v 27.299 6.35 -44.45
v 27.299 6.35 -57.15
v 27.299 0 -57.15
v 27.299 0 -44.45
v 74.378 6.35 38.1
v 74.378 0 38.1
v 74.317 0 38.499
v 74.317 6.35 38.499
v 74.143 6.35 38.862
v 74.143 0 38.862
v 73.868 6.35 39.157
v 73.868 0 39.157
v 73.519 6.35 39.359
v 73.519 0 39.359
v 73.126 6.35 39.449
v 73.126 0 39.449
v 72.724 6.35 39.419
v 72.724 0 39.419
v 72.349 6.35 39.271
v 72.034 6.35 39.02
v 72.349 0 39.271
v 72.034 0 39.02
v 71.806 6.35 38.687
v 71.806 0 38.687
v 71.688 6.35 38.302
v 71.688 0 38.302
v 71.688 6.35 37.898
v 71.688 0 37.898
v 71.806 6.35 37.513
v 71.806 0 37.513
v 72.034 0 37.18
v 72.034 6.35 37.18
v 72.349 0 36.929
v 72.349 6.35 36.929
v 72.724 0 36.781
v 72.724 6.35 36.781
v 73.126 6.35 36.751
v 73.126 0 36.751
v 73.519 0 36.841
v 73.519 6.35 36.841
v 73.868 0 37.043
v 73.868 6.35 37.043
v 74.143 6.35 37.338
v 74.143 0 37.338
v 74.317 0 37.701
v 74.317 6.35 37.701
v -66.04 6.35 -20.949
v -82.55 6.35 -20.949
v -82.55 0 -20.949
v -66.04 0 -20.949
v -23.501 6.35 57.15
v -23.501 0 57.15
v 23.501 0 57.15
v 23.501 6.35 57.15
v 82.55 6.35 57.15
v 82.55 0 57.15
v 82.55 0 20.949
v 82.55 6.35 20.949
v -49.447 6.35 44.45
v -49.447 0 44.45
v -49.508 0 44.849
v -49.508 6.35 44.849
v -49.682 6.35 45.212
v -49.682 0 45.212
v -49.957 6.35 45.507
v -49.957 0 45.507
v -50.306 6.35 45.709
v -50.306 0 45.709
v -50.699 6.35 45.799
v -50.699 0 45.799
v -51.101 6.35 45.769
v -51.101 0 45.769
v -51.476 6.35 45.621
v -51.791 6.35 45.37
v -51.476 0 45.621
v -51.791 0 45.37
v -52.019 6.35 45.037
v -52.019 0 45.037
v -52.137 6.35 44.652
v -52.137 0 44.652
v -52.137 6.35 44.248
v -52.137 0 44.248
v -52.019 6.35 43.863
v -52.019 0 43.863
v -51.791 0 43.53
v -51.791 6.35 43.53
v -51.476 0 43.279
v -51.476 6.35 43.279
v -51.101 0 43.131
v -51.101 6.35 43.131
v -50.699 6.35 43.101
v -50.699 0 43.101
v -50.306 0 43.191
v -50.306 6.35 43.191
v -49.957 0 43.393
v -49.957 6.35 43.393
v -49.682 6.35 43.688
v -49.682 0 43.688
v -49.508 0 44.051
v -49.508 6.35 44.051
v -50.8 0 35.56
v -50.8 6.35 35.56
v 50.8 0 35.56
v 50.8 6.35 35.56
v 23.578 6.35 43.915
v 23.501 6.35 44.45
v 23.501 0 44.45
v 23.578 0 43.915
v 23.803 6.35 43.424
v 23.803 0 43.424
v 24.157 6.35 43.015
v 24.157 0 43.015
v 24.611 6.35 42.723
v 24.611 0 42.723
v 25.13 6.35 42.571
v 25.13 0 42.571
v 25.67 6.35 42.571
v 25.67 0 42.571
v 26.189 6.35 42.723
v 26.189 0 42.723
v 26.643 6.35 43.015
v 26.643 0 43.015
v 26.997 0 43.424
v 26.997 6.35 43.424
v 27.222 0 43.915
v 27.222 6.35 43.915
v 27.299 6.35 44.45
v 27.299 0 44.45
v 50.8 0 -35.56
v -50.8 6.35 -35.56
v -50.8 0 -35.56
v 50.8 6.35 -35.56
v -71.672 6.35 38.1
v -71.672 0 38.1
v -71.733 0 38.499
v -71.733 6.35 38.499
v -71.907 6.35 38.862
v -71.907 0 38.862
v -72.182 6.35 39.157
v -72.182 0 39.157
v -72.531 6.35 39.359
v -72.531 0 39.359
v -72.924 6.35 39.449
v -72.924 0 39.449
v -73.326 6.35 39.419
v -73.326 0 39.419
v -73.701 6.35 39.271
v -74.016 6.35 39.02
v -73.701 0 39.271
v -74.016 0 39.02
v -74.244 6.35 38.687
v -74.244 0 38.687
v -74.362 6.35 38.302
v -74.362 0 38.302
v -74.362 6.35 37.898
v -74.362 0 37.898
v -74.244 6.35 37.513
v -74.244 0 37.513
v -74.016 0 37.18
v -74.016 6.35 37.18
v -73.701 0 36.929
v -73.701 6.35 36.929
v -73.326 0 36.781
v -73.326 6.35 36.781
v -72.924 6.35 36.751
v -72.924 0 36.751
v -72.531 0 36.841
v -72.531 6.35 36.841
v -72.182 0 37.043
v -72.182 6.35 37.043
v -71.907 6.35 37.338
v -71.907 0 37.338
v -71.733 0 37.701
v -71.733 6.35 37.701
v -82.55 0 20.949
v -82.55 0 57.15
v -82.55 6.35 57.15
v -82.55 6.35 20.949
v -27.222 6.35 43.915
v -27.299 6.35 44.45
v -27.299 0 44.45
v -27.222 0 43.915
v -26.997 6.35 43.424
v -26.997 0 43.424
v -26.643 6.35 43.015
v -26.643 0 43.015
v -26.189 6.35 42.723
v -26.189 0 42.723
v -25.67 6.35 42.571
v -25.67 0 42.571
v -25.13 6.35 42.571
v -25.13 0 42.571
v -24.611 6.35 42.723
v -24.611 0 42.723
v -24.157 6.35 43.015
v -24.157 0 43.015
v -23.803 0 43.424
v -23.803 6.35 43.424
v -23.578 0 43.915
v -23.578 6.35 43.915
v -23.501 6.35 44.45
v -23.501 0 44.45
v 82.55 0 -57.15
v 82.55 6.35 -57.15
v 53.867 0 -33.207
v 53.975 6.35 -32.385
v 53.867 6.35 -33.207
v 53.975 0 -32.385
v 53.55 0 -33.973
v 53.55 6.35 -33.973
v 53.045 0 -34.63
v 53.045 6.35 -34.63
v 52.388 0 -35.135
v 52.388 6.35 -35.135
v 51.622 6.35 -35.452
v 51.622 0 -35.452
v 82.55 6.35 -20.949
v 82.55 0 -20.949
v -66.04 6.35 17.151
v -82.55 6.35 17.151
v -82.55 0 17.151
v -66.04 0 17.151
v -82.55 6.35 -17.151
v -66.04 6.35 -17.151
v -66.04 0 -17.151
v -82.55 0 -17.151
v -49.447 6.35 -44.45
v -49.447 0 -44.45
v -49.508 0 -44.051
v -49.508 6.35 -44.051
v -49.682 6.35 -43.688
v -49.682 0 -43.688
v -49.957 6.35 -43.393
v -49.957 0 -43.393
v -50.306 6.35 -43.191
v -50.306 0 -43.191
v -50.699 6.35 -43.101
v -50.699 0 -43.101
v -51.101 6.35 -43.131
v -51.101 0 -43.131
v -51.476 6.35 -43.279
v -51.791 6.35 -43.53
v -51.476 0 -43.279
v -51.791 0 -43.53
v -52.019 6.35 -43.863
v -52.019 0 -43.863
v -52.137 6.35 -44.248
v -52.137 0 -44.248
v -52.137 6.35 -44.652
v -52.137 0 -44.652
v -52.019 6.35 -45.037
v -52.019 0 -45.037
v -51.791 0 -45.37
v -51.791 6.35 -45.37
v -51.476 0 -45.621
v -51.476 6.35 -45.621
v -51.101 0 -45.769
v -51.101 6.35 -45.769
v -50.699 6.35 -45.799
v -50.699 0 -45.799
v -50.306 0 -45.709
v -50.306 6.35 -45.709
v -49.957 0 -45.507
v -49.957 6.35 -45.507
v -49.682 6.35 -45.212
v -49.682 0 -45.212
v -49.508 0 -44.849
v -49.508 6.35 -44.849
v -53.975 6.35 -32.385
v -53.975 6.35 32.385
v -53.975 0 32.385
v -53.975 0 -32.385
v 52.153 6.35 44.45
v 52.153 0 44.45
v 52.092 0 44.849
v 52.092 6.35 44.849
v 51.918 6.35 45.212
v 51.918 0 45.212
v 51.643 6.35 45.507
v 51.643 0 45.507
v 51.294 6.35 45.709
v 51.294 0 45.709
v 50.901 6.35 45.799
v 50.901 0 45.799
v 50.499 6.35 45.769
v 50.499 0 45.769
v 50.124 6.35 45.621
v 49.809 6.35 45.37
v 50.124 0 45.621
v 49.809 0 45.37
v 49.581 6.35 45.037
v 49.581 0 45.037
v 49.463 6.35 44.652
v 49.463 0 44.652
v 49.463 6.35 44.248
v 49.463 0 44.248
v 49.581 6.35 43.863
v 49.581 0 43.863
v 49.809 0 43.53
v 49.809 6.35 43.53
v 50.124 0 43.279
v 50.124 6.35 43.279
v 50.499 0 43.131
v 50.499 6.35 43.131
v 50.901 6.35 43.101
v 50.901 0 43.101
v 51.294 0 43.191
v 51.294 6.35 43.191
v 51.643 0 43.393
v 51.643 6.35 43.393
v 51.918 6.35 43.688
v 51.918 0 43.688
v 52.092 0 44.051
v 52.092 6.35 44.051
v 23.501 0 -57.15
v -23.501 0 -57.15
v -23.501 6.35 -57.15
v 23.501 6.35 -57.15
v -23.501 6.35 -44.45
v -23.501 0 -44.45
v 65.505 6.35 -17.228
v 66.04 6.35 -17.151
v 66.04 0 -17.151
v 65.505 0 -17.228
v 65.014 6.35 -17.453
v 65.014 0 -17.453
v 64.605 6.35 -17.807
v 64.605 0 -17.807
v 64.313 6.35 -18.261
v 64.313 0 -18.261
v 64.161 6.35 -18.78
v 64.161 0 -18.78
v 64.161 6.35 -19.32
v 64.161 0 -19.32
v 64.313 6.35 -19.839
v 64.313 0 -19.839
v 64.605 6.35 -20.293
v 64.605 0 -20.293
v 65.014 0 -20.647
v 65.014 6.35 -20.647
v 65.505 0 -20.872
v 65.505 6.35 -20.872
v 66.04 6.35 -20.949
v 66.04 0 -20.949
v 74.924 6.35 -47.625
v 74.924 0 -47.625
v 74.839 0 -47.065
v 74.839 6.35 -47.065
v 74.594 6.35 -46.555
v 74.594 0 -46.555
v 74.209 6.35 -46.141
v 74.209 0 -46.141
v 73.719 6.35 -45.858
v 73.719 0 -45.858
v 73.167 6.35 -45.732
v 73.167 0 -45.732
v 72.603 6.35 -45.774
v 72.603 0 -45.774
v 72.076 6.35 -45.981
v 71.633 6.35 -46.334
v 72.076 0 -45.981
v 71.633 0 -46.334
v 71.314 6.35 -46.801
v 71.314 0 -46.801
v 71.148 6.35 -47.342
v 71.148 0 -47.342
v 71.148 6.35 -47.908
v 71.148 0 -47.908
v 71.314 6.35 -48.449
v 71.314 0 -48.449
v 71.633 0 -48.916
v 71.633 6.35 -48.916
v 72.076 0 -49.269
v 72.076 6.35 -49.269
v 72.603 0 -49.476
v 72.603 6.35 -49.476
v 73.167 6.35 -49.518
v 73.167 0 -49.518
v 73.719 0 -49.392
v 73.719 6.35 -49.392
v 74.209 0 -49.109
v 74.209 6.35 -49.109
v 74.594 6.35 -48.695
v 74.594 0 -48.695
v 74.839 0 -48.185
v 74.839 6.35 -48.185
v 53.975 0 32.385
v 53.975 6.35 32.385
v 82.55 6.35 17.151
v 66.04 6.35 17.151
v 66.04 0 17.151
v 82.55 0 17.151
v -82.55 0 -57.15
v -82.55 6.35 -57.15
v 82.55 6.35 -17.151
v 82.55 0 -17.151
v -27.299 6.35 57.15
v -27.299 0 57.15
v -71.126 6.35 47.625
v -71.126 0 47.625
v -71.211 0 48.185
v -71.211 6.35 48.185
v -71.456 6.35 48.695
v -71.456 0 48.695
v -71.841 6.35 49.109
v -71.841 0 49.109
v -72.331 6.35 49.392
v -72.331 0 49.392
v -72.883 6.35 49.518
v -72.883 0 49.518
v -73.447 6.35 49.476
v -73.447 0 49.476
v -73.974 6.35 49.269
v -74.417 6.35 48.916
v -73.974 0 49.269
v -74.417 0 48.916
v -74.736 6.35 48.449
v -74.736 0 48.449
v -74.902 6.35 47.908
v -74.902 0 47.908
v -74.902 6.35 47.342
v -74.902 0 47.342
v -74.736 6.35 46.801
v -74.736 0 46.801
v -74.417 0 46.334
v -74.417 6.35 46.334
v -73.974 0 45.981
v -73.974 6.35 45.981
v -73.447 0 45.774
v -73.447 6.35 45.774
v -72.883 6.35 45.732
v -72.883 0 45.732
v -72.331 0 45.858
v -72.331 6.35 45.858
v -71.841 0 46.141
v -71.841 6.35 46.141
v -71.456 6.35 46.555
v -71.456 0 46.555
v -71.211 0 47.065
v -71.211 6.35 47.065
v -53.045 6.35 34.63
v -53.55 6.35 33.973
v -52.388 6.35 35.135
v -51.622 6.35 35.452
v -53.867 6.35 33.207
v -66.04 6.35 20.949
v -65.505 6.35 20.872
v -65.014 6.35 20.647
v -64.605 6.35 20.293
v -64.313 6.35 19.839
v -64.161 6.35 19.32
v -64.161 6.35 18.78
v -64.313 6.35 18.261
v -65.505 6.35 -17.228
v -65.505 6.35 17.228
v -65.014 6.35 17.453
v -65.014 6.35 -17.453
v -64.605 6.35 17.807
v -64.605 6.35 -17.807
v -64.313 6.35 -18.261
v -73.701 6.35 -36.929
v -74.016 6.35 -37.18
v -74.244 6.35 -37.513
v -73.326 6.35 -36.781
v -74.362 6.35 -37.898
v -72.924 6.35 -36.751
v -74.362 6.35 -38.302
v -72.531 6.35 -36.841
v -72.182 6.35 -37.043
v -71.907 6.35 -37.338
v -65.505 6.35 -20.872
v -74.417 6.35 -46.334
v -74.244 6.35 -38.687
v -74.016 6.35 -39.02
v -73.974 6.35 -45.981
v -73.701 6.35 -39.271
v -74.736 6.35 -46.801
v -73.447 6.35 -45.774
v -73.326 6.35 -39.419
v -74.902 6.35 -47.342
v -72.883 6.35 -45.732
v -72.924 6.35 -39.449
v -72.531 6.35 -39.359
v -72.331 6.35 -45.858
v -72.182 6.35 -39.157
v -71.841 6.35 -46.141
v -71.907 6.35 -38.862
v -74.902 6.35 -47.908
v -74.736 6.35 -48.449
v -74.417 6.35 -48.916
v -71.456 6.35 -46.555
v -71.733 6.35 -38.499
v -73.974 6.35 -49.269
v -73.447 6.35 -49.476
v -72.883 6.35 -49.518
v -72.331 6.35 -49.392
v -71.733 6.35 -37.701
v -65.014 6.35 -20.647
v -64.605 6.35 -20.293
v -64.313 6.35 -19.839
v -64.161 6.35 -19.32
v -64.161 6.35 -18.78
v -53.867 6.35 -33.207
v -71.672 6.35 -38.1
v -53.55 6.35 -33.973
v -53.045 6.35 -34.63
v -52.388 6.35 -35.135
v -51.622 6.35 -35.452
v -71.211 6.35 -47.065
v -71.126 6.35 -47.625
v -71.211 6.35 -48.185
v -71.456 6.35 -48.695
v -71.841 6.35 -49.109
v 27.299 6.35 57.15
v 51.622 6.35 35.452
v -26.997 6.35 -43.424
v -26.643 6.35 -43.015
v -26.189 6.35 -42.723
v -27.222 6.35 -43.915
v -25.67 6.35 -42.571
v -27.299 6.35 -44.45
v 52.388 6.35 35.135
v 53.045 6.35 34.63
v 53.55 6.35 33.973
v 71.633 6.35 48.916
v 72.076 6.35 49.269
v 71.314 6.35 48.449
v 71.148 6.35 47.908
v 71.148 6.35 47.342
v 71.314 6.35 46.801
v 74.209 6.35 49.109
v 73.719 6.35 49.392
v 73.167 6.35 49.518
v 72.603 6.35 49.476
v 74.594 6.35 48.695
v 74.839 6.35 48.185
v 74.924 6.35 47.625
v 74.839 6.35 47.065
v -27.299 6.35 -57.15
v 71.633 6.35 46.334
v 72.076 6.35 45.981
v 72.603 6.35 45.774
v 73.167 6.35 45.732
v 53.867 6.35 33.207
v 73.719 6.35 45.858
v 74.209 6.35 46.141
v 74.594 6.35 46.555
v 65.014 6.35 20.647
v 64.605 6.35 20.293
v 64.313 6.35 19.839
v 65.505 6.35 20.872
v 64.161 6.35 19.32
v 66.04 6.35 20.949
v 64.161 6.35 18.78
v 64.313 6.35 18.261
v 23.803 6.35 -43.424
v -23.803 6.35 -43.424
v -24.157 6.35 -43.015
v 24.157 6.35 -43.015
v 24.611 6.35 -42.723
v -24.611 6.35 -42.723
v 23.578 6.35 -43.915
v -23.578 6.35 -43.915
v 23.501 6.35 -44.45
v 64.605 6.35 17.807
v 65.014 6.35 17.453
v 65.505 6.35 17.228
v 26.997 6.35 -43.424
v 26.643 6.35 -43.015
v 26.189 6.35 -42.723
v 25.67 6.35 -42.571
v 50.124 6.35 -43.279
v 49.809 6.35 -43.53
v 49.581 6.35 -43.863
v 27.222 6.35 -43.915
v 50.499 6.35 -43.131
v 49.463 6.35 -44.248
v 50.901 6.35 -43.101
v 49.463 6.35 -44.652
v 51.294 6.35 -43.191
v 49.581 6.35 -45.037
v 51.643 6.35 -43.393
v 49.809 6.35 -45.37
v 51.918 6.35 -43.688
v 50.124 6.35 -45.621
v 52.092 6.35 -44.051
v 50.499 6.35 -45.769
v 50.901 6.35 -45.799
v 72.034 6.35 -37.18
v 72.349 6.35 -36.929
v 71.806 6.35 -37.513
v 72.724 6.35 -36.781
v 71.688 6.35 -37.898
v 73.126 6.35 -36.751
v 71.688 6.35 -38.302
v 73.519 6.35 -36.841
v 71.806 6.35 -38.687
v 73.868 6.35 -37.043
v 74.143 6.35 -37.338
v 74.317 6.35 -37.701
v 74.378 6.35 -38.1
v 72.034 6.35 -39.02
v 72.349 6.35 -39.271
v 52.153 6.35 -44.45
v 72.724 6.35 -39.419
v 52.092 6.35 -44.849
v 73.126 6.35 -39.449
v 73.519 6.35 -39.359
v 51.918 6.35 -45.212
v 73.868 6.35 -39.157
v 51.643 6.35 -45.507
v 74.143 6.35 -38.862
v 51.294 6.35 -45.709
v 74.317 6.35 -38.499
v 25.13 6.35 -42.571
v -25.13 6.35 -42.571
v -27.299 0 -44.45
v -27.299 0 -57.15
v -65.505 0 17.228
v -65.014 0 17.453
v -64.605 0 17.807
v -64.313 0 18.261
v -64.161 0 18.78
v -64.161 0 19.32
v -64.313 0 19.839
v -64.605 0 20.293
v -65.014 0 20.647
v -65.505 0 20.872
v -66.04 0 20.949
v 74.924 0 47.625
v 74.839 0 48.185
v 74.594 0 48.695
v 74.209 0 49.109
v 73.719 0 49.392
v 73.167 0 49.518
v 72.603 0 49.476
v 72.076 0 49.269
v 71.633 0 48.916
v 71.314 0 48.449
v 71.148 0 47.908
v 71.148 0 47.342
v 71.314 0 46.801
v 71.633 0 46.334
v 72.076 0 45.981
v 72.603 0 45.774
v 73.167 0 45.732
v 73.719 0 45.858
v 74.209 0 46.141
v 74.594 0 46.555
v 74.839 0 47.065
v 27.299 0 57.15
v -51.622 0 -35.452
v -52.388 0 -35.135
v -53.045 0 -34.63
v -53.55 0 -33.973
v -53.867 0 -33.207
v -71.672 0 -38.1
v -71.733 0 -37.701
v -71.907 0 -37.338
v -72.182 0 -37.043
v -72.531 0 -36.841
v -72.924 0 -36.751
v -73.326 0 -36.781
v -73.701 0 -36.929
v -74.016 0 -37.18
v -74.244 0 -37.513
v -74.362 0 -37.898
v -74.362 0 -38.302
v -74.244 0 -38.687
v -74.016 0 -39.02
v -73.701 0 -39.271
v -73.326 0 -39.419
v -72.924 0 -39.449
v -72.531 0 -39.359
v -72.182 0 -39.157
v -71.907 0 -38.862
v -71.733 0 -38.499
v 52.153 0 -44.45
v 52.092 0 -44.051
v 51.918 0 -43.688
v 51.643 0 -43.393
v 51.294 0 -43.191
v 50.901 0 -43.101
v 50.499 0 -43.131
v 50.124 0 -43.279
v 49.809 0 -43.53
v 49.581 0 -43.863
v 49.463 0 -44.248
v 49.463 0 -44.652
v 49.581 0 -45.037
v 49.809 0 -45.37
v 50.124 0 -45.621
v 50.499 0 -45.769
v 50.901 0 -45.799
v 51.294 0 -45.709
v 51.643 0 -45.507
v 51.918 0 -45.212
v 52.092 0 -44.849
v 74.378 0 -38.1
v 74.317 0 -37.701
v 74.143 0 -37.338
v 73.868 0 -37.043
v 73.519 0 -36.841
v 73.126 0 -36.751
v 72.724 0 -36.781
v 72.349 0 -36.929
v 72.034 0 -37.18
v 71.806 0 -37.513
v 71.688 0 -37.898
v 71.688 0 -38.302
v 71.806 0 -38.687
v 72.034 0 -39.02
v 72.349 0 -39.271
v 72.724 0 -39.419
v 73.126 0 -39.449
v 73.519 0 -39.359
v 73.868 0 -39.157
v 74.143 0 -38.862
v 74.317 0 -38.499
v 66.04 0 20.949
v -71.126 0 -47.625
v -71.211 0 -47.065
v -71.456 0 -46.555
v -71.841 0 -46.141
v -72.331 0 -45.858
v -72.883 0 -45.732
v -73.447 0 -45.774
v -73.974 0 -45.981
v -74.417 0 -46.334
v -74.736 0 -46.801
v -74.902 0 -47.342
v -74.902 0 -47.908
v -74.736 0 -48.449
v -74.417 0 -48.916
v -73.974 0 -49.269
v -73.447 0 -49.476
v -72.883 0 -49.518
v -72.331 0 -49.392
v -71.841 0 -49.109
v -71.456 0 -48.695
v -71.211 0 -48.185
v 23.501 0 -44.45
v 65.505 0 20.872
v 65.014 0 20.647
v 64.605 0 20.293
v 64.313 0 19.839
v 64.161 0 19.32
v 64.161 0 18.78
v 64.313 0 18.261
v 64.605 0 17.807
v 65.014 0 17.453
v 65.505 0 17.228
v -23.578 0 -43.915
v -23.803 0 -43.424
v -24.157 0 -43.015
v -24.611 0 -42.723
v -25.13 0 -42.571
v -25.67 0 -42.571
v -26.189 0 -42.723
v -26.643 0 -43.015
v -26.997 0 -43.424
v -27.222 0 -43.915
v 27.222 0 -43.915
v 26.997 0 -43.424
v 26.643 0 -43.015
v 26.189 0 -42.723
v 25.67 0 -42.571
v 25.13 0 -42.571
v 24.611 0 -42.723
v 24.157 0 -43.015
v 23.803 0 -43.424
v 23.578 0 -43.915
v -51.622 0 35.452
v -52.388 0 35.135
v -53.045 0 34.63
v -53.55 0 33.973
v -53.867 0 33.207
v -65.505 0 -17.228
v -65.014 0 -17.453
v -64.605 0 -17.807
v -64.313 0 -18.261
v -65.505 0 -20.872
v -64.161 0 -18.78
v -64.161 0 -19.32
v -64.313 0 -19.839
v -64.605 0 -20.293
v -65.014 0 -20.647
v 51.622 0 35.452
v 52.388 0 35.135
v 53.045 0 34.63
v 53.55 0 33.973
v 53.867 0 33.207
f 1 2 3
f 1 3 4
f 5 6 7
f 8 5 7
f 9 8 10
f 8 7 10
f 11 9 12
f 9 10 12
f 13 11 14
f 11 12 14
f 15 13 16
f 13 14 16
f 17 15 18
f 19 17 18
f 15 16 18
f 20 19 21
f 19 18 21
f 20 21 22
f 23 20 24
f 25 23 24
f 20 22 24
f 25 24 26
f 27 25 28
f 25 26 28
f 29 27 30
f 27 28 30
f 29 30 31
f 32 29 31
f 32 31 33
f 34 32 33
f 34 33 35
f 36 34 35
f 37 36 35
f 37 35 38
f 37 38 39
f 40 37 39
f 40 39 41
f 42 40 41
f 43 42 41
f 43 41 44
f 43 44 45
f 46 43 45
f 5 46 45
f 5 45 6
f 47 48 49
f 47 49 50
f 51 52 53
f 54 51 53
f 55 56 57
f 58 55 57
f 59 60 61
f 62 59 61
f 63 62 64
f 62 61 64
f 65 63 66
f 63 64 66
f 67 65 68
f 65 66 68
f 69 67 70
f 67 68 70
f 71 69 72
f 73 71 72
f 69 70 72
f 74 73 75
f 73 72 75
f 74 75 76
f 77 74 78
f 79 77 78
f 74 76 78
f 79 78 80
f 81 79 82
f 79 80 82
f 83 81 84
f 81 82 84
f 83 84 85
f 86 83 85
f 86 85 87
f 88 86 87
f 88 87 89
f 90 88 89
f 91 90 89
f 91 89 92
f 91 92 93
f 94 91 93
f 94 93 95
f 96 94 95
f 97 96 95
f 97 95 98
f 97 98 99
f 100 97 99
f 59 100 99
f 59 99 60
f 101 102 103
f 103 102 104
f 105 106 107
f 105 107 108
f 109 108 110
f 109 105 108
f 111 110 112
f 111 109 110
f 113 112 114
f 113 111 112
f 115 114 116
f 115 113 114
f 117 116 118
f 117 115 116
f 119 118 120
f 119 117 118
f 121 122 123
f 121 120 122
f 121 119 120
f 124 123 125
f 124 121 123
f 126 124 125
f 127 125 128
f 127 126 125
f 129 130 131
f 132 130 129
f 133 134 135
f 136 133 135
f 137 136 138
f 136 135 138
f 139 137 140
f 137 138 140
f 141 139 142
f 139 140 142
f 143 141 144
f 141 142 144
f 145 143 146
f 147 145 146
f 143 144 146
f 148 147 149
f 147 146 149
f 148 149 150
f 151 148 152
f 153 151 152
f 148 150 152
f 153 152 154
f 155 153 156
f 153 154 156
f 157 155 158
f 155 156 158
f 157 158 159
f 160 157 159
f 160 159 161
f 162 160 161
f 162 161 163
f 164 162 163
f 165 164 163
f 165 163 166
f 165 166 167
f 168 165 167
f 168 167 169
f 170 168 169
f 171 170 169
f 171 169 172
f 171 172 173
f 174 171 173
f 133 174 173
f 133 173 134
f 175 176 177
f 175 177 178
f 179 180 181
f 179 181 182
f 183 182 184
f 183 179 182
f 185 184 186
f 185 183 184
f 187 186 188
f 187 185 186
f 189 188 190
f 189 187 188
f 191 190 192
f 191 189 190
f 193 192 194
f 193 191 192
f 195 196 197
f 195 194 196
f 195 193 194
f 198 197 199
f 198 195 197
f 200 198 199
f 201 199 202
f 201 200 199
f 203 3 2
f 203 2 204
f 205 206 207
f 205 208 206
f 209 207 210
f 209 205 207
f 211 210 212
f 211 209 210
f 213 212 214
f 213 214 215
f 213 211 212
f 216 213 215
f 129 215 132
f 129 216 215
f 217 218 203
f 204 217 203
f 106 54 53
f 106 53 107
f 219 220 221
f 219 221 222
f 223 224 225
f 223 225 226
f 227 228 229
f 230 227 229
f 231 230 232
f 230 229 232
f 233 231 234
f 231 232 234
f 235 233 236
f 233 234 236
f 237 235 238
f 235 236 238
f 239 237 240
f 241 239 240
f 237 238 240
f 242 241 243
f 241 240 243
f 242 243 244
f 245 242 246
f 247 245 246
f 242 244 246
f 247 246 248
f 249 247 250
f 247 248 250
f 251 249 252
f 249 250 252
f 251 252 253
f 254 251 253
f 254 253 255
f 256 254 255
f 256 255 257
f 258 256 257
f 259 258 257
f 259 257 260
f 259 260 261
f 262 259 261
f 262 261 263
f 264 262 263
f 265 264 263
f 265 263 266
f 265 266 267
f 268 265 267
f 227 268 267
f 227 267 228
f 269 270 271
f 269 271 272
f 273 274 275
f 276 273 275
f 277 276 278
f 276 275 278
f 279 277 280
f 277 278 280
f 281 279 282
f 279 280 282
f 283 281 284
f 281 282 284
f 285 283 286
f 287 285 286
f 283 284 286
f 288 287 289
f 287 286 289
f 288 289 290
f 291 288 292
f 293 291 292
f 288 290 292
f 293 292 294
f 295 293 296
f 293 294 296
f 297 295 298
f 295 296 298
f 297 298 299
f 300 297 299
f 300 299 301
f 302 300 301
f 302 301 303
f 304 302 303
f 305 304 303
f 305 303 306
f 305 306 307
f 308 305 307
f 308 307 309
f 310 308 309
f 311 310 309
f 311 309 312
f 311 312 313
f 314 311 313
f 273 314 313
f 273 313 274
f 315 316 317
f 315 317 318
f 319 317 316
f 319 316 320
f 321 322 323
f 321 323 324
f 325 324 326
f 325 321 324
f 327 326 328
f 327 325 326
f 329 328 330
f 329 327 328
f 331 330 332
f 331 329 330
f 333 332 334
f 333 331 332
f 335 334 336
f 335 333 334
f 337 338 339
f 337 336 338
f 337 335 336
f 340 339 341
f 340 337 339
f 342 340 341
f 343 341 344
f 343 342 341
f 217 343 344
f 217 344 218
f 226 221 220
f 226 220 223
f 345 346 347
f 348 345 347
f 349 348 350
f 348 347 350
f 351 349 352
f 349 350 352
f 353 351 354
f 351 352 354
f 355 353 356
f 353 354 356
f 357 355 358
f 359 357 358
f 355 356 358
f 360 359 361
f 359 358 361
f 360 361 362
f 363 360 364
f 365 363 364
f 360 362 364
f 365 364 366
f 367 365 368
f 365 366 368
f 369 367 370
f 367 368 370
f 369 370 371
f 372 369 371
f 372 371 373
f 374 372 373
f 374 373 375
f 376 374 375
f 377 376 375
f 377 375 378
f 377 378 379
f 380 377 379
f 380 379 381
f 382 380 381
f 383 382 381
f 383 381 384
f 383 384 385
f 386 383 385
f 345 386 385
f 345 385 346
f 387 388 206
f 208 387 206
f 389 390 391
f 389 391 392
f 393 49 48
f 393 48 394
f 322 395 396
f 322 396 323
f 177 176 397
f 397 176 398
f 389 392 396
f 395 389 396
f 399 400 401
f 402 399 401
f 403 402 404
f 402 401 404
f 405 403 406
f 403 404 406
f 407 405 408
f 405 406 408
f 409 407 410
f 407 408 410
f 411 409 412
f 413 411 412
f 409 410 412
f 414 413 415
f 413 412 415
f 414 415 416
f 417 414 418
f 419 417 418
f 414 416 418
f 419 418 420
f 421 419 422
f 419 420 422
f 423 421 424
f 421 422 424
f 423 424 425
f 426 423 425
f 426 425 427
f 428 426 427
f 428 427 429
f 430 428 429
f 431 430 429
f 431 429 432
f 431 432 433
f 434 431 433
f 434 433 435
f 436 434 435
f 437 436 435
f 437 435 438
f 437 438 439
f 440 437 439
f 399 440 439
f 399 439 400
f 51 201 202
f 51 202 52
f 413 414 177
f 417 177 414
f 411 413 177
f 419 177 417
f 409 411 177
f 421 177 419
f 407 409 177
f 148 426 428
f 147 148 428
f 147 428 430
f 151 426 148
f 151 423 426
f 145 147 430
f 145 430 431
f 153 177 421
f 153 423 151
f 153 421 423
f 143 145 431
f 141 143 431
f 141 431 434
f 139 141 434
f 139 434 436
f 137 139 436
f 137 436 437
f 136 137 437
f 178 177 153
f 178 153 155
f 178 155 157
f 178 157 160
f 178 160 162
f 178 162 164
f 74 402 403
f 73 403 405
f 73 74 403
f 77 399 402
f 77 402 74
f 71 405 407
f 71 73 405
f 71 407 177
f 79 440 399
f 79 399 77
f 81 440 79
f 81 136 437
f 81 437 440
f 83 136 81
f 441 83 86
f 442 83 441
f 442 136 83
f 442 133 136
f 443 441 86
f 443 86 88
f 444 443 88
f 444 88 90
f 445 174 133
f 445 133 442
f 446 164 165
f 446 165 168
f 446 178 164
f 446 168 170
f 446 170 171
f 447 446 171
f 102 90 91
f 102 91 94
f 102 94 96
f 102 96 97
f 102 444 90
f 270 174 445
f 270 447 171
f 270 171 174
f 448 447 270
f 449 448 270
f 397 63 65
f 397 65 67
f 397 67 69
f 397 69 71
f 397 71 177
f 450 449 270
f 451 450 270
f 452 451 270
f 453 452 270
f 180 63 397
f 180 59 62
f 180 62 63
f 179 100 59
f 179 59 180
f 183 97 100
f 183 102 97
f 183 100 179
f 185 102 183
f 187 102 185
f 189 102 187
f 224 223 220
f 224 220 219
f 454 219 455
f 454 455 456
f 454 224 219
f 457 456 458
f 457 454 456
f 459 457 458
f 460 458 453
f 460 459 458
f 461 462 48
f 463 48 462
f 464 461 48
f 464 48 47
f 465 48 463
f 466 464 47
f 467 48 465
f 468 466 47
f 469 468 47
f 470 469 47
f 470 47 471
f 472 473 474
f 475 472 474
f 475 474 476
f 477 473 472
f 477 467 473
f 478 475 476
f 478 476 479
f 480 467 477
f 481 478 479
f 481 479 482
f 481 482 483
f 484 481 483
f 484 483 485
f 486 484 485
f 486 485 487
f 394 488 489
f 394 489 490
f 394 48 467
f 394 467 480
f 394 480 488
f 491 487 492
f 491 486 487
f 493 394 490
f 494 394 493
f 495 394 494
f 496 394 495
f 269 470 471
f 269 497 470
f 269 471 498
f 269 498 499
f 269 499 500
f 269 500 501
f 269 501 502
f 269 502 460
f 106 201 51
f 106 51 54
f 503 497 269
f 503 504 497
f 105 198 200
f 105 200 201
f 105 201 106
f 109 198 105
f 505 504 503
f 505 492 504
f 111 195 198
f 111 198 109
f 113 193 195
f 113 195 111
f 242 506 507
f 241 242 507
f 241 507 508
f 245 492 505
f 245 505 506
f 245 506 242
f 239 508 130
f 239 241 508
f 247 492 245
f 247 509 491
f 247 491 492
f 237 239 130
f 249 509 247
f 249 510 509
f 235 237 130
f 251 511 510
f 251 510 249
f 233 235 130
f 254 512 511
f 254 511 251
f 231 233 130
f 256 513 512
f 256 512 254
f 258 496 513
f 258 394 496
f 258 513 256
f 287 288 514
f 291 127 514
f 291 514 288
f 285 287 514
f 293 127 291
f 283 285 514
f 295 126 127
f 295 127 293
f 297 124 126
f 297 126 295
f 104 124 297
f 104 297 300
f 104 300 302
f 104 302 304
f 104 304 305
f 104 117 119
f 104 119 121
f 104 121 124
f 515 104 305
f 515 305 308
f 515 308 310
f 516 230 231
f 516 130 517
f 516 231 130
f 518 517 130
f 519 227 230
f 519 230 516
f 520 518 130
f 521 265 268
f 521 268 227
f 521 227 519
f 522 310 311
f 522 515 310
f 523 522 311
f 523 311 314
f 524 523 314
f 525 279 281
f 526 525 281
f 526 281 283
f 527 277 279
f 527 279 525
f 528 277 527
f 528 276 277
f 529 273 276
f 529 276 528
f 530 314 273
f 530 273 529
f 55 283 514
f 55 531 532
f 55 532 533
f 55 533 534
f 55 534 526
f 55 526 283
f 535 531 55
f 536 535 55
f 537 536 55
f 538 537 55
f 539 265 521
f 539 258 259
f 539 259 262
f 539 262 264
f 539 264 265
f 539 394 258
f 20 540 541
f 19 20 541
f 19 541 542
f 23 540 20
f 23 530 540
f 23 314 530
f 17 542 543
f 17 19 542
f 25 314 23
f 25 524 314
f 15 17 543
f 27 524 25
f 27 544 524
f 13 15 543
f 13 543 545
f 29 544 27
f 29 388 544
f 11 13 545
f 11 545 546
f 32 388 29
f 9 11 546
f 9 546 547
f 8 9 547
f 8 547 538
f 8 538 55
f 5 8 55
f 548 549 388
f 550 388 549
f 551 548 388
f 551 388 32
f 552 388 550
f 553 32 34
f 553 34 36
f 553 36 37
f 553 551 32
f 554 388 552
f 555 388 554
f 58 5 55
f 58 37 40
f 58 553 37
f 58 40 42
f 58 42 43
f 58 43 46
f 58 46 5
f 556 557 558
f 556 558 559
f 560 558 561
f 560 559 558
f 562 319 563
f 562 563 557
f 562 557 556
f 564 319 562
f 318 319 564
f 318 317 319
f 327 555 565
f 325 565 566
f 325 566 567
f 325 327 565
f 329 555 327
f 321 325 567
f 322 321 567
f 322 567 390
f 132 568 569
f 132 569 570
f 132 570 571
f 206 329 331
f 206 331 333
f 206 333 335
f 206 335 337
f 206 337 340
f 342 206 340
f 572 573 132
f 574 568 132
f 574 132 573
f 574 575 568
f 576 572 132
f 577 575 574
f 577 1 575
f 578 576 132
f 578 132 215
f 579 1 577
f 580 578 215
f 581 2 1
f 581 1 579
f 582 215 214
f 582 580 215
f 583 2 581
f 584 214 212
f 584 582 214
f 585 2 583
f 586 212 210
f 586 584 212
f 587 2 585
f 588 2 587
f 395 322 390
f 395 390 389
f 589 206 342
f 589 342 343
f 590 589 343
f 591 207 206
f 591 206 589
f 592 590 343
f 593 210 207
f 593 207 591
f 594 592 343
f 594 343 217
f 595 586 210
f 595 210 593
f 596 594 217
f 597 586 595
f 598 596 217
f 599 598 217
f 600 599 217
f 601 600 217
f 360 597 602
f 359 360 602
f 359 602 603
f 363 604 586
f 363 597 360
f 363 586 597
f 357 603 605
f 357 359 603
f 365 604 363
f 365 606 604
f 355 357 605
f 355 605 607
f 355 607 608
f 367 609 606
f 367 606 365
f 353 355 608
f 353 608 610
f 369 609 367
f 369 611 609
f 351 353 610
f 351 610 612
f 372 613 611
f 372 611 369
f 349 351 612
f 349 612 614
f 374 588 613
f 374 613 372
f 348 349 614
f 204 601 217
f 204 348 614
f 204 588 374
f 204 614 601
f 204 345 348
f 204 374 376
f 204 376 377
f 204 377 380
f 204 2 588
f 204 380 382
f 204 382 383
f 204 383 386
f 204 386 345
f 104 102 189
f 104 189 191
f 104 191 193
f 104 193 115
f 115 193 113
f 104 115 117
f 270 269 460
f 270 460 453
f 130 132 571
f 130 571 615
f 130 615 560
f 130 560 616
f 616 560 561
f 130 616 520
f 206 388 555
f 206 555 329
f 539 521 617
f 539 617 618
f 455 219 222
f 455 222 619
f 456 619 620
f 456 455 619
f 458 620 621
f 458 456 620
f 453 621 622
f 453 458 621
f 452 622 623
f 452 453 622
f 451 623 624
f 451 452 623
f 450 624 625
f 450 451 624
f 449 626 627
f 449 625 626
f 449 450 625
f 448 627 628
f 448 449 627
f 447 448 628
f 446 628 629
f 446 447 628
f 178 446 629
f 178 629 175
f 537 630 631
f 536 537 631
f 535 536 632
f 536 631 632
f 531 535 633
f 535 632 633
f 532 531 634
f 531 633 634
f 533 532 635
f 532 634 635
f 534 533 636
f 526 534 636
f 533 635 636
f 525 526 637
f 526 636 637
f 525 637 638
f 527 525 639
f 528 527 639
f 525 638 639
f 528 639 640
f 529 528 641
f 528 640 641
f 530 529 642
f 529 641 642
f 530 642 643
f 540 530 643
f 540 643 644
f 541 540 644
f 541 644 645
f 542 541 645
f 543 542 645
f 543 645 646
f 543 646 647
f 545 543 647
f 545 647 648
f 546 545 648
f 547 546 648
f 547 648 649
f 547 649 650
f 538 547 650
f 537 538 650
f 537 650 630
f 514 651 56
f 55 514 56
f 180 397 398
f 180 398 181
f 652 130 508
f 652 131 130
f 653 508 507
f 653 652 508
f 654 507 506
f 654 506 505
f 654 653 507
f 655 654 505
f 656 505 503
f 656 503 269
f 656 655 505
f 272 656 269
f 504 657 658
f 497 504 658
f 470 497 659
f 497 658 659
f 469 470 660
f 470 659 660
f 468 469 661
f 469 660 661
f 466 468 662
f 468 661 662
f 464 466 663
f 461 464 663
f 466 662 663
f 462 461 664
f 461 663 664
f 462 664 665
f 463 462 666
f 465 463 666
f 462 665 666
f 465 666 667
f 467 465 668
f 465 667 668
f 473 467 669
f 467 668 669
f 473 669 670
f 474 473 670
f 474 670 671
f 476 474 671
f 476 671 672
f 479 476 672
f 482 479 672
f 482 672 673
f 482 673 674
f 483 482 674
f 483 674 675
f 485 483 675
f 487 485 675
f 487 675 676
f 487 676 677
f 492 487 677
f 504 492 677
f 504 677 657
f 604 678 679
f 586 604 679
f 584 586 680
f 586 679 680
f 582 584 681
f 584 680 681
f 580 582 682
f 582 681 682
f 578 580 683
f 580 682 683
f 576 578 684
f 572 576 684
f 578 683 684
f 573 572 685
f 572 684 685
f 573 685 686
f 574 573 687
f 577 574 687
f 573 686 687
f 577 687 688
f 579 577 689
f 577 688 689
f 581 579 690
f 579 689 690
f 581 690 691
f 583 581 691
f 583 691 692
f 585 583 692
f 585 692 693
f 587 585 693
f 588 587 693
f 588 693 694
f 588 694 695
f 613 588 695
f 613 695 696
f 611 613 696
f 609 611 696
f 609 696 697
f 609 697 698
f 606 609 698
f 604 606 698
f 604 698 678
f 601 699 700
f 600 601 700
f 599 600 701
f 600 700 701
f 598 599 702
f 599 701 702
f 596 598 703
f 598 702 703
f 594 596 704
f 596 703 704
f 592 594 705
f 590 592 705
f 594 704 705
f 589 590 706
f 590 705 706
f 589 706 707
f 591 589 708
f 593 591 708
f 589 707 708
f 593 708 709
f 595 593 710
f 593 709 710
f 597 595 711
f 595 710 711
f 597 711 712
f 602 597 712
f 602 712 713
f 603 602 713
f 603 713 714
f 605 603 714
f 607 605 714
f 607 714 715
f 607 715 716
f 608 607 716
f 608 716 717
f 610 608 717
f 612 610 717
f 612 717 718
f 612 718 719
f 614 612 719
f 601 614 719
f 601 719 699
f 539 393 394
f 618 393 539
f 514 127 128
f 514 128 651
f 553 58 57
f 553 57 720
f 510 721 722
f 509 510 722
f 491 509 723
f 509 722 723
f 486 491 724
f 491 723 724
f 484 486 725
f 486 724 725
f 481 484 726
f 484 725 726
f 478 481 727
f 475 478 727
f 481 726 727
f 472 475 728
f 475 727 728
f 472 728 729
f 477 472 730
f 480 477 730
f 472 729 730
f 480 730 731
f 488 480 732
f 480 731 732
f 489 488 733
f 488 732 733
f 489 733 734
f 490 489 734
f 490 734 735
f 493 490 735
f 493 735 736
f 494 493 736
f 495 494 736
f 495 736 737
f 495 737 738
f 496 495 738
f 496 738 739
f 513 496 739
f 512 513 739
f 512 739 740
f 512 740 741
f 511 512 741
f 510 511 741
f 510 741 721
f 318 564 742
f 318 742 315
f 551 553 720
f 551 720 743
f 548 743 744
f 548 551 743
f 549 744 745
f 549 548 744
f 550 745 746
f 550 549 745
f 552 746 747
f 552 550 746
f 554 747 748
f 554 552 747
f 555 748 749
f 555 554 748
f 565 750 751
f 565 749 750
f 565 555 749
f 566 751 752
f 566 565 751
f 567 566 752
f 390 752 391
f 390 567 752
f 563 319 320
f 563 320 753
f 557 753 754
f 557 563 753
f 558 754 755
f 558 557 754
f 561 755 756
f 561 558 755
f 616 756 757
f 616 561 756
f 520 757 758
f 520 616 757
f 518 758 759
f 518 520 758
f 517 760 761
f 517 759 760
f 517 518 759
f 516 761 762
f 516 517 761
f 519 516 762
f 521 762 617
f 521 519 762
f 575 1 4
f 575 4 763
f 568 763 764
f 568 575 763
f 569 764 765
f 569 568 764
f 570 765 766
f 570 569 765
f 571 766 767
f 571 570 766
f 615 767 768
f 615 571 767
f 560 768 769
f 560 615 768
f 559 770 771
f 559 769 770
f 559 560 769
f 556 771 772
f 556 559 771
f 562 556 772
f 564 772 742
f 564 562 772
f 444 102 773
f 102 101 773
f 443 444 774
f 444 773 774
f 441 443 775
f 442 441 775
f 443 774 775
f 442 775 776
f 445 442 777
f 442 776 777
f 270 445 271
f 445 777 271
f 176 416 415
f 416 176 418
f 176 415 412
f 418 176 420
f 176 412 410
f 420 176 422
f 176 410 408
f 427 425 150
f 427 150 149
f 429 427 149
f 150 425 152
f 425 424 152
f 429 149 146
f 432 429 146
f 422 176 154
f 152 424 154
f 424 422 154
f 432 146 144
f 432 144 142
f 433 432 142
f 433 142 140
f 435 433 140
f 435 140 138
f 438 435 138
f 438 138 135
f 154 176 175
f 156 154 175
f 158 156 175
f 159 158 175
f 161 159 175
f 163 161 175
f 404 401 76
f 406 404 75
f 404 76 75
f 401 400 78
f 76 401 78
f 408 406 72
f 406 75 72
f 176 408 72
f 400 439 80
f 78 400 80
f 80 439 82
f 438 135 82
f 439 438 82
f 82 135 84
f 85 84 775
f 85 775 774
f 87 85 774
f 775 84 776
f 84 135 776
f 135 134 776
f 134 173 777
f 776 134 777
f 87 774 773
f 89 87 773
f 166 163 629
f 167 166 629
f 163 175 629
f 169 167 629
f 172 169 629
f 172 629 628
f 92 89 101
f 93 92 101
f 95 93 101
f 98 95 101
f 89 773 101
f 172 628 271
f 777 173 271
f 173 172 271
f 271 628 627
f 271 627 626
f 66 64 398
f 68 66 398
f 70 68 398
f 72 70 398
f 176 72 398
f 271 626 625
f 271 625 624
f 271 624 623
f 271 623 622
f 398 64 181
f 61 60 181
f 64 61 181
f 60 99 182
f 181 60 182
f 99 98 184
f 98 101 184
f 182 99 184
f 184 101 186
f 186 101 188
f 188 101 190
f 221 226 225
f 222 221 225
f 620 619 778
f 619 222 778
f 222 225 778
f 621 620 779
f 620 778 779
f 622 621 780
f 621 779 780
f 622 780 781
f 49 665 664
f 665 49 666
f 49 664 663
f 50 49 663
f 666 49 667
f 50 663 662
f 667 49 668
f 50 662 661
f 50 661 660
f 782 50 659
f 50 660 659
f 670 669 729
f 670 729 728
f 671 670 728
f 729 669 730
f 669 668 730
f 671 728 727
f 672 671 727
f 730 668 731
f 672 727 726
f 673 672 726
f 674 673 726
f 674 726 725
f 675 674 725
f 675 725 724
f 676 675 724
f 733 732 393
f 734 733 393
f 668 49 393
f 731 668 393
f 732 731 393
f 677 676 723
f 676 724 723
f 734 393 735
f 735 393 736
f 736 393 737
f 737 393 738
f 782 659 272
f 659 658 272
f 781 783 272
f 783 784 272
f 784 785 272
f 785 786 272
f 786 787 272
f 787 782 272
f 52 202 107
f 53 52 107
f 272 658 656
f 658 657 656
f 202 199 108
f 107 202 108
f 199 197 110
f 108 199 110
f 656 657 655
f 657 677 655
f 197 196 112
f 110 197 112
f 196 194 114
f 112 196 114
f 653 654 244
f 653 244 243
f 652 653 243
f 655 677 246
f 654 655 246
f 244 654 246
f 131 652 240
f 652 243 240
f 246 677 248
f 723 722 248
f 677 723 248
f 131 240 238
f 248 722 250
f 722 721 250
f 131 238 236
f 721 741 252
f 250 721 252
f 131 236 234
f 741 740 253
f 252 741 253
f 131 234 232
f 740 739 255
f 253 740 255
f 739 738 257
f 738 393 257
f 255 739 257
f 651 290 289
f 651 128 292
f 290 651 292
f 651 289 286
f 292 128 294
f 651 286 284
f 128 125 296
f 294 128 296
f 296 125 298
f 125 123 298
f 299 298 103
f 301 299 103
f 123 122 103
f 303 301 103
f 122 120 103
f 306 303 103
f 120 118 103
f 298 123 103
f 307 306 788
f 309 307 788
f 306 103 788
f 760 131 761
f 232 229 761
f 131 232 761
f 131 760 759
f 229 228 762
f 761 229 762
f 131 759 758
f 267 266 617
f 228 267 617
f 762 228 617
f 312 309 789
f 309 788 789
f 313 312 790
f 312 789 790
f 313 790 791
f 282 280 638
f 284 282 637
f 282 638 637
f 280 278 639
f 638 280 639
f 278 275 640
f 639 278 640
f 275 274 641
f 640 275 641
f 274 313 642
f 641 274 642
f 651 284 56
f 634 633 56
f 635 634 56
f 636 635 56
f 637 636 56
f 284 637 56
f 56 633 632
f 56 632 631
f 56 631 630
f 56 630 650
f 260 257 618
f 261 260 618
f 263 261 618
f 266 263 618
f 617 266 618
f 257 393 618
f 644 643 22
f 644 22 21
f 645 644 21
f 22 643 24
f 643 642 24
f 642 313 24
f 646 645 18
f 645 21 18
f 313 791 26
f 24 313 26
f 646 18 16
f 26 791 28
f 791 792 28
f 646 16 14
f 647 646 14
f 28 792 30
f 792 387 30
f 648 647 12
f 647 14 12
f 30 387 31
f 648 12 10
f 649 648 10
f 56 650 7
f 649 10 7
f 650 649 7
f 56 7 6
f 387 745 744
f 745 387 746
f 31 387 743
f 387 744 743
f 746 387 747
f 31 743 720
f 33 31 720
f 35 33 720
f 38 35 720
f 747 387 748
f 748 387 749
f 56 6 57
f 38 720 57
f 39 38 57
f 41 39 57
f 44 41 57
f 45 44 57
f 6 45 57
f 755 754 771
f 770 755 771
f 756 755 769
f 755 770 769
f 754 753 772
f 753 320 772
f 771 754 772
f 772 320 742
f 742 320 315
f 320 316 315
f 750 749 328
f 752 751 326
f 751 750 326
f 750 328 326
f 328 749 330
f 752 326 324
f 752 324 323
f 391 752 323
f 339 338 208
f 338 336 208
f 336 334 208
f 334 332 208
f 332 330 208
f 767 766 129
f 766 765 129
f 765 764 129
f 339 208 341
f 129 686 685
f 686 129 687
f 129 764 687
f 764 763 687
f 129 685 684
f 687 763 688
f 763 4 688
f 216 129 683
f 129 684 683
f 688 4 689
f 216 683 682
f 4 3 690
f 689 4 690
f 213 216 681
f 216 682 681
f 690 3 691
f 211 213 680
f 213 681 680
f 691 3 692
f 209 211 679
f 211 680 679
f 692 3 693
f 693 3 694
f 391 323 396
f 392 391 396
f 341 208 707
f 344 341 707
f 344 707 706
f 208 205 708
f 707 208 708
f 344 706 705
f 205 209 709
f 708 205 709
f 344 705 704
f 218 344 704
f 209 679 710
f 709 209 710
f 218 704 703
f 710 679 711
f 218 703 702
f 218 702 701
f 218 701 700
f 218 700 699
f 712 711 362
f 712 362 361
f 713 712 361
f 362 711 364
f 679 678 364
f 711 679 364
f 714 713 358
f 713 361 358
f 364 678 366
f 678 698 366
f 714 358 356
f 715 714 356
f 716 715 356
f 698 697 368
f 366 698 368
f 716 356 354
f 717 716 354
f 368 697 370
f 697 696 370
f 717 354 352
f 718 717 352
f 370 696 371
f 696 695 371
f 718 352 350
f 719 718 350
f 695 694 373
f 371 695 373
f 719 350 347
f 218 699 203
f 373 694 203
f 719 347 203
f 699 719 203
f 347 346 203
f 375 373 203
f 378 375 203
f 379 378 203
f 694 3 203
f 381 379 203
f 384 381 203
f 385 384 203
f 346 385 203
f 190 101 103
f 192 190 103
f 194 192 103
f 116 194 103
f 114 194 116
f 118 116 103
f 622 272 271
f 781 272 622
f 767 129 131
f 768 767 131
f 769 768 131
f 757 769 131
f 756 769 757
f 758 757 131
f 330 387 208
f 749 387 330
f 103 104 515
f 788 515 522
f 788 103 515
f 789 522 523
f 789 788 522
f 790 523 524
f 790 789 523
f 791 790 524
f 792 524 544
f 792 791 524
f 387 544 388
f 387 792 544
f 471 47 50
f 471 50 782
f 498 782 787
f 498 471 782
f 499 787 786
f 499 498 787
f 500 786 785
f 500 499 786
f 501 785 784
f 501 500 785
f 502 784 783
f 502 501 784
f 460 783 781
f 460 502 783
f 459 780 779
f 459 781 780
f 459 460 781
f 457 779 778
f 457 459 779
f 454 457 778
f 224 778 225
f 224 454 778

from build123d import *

# Parameters (mm, degrees)
SKETCH1_W              = 165.1
SKETCH1_H              = 114.3
BOSS_EXTRUDE1_DEPTH    = 6.35
F_10_24_TAPPED_HOLE2_D = 3.7973
F_6_32_TAPPED_HOLE2_D  = 2.7051
CUT_EXTRUDE10_DEPTH    = 101.602919938
F_6_32_TAPPED_HOLE1_D  = 2.7051
SKETCH24_W             = 107.95
SKETCH24_H             = 71.12
CUT_EXTRUDE11_DEPTH    = 101.602919938
FILLET1_R              = 3.175


with BuildPart() as part:
    # Sketch1 → Boss-Extrude1 (new body)
    with BuildSketch(Plane(origin=(0, 0, 0), x_dir=(1, 0, 0), z_dir=(0, 1, 0))):
        Rectangle(SKETCH1_W, SKETCH1_H)
    extrude(amount=BOSS_EXTRUDE1_DEPTH)

    # #10-24 Tapped Hole2 (through all)
    with Locations(Plane(origin=(0, 6.35, 0), x_dir=(-1, 0, 0), z_dir=(0, 1, 0))):
        with Locations((73.025, -47.625), (73.025, 47.625), (-73.025, -47.625), (-73.025, 47.625)):
            Hole(F_10_24_TAPPED_HOLE2_D / 2)

    # #6-32 Tapped Hole2 (through all)
    with Locations(Plane(origin=(0, 6.35, 0), x_dir=(-1, 0, 0), z_dir=(0, 1, 0))):
        with Locations((50.8, -44.45), (-50.8, -44.45), (-50.8, 44.45), (50.8, 44.45)):
            Hole(F_6_32_TAPPED_HOLE2_D / 2)

    # Sketch21 → Cut-Extrude10 (cut, through all)
    with BuildSketch(Plane(origin=(0, 6.35, 0), x_dir=(1, 0, 0), z_dir=(0, 1, 0))):
        with BuildLine():
            Line((-82.55, 20.94865), (-66.04, 20.94865))
            ThreePointArc((-66.04, 20.94865), (-64.14135, 19.05), (-66.04, 17.15135))
            Line((-66.04, 17.15135), (-82.55, 17.15135))
            ThreePointArc((-82.55, 17.15135), (-84.44865, 19.05), (-82.55, 20.94865))
        make_face()
        with BuildLine():
            Line((-82.55, -17.15135), (-66.04, -17.15135))
            ThreePointArc((-66.04, -17.15135), (-64.14135, -19.05), (-66.04, -20.94865))
            Line((-66.04, -20.94865), (-82.55, -20.94865))
            ThreePointArc((-82.55, -20.94865), (-84.44865, -19.05), (-82.55, -17.15135))
        make_face()
        with BuildLine():
            Line((-23.50135, 57.15), (-23.50135, 44.45))
            ThreePointArc((-23.50135, 44.45), (-25.4, 42.55135), (-27.29865, 44.45))
            Line((-27.29865, 44.45), (-27.29865, 57.15))
            ThreePointArc((-27.29865, 57.15), (-25.4, 59.04865), (-23.50135, 57.15))
        make_face()
        with BuildLine():
            Line((27.29865, 57.15), (27.29865, 44.45))
            ThreePointArc((27.29865, 44.45), (25.4, 42.55135), (23.50135, 44.45))
            Line((23.50135, 44.45), (23.50135, 57.15))
            ThreePointArc((23.50135, 57.15), (25.4, 59.04865), (27.29865, 57.15))
        make_face()
        with BuildLine():
            Line((66.04, 20.94865), (82.55, 20.94865))
            ThreePointArc((82.55, 20.94865), (84.44865, 19.05), (82.55, 17.15135))
            Line((82.55, 17.15135), (66.04, 17.15135))
            ThreePointArc((66.04, 17.15135), (64.14135, 19.05), (66.04, 20.94865))
        make_face()
        with BuildLine():
            Line((66.04, -17.15135), (82.55, -17.15135))
            ThreePointArc((82.55, -17.15135), (84.44865, -19.05), (82.55, -20.94865))
            Line((82.55, -20.94865), (66.04, -20.94865))
            ThreePointArc((66.04, -20.94865), (64.14135, -19.05), (66.04, -17.15135))
        make_face()
        with BuildLine():
            Line((-27.29865, -57.15), (-27.29865, -44.45))
            ThreePointArc((-27.29865, -44.45), (-25.4, -42.55135), (-23.50135, -44.45))
            Line((-23.50135, -44.45), (-23.50135, -57.15))
            ThreePointArc((-23.50135, -57.15), (-25.4, -59.04865), (-27.29865, -57.15))
        make_face()
        with BuildLine():
            Line((23.50135, -57.15), (23.50135, -44.45))
            ThreePointArc((23.50135, -44.45), (25.4, -42.55135), (27.29865, -44.45))
            Line((27.29865, -44.45), (27.29865, -57.15))
            ThreePointArc((27.29865, -57.15), (25.4, -59.04865), (23.50135, -57.15))
        make_face()
    extrude(amount=-CUT_EXTRUDE10_DEPTH, mode=Mode.SUBTRACT)

    # #6-32 Tapped Hole1 (through all)
    with Locations(Plane(origin=(0, 6.35, 0), x_dir=(-1, 0, 0), z_dir=(0, 1, 0))):
        with Locations((73.025, -38.1), (73.025, 38.1), (-73.025, -38.1), (-73.025, 38.1)):
            Hole(F_6_32_TAPPED_HOLE1_D / 2)

    # Sketch24 → Cut-Extrude11 (cut, through all)
    with BuildSketch(Plane(origin=(0, 6.35, 0), x_dir=(1, 0, 0), z_dir=(0, 1, 0))):
        Rectangle(SKETCH24_W, SKETCH24_H)
    extrude(amount=-CUT_EXTRUDE11_DEPTH, mode=Mode.SUBTRACT)

    # Fillet1
    fillet1_edges = [part.edges().sort_by_distance(p)[0] for p in [
        (-53.975, 3.175, 35.56),
        (-53.975, 3.175, -35.56),
        (53.975, 3.175, -35.56),
        (53.975, 3.175, 35.56),
    ]]
    fillet(fillet1_edges, radius=FILLET1_R)


solid = part.part
